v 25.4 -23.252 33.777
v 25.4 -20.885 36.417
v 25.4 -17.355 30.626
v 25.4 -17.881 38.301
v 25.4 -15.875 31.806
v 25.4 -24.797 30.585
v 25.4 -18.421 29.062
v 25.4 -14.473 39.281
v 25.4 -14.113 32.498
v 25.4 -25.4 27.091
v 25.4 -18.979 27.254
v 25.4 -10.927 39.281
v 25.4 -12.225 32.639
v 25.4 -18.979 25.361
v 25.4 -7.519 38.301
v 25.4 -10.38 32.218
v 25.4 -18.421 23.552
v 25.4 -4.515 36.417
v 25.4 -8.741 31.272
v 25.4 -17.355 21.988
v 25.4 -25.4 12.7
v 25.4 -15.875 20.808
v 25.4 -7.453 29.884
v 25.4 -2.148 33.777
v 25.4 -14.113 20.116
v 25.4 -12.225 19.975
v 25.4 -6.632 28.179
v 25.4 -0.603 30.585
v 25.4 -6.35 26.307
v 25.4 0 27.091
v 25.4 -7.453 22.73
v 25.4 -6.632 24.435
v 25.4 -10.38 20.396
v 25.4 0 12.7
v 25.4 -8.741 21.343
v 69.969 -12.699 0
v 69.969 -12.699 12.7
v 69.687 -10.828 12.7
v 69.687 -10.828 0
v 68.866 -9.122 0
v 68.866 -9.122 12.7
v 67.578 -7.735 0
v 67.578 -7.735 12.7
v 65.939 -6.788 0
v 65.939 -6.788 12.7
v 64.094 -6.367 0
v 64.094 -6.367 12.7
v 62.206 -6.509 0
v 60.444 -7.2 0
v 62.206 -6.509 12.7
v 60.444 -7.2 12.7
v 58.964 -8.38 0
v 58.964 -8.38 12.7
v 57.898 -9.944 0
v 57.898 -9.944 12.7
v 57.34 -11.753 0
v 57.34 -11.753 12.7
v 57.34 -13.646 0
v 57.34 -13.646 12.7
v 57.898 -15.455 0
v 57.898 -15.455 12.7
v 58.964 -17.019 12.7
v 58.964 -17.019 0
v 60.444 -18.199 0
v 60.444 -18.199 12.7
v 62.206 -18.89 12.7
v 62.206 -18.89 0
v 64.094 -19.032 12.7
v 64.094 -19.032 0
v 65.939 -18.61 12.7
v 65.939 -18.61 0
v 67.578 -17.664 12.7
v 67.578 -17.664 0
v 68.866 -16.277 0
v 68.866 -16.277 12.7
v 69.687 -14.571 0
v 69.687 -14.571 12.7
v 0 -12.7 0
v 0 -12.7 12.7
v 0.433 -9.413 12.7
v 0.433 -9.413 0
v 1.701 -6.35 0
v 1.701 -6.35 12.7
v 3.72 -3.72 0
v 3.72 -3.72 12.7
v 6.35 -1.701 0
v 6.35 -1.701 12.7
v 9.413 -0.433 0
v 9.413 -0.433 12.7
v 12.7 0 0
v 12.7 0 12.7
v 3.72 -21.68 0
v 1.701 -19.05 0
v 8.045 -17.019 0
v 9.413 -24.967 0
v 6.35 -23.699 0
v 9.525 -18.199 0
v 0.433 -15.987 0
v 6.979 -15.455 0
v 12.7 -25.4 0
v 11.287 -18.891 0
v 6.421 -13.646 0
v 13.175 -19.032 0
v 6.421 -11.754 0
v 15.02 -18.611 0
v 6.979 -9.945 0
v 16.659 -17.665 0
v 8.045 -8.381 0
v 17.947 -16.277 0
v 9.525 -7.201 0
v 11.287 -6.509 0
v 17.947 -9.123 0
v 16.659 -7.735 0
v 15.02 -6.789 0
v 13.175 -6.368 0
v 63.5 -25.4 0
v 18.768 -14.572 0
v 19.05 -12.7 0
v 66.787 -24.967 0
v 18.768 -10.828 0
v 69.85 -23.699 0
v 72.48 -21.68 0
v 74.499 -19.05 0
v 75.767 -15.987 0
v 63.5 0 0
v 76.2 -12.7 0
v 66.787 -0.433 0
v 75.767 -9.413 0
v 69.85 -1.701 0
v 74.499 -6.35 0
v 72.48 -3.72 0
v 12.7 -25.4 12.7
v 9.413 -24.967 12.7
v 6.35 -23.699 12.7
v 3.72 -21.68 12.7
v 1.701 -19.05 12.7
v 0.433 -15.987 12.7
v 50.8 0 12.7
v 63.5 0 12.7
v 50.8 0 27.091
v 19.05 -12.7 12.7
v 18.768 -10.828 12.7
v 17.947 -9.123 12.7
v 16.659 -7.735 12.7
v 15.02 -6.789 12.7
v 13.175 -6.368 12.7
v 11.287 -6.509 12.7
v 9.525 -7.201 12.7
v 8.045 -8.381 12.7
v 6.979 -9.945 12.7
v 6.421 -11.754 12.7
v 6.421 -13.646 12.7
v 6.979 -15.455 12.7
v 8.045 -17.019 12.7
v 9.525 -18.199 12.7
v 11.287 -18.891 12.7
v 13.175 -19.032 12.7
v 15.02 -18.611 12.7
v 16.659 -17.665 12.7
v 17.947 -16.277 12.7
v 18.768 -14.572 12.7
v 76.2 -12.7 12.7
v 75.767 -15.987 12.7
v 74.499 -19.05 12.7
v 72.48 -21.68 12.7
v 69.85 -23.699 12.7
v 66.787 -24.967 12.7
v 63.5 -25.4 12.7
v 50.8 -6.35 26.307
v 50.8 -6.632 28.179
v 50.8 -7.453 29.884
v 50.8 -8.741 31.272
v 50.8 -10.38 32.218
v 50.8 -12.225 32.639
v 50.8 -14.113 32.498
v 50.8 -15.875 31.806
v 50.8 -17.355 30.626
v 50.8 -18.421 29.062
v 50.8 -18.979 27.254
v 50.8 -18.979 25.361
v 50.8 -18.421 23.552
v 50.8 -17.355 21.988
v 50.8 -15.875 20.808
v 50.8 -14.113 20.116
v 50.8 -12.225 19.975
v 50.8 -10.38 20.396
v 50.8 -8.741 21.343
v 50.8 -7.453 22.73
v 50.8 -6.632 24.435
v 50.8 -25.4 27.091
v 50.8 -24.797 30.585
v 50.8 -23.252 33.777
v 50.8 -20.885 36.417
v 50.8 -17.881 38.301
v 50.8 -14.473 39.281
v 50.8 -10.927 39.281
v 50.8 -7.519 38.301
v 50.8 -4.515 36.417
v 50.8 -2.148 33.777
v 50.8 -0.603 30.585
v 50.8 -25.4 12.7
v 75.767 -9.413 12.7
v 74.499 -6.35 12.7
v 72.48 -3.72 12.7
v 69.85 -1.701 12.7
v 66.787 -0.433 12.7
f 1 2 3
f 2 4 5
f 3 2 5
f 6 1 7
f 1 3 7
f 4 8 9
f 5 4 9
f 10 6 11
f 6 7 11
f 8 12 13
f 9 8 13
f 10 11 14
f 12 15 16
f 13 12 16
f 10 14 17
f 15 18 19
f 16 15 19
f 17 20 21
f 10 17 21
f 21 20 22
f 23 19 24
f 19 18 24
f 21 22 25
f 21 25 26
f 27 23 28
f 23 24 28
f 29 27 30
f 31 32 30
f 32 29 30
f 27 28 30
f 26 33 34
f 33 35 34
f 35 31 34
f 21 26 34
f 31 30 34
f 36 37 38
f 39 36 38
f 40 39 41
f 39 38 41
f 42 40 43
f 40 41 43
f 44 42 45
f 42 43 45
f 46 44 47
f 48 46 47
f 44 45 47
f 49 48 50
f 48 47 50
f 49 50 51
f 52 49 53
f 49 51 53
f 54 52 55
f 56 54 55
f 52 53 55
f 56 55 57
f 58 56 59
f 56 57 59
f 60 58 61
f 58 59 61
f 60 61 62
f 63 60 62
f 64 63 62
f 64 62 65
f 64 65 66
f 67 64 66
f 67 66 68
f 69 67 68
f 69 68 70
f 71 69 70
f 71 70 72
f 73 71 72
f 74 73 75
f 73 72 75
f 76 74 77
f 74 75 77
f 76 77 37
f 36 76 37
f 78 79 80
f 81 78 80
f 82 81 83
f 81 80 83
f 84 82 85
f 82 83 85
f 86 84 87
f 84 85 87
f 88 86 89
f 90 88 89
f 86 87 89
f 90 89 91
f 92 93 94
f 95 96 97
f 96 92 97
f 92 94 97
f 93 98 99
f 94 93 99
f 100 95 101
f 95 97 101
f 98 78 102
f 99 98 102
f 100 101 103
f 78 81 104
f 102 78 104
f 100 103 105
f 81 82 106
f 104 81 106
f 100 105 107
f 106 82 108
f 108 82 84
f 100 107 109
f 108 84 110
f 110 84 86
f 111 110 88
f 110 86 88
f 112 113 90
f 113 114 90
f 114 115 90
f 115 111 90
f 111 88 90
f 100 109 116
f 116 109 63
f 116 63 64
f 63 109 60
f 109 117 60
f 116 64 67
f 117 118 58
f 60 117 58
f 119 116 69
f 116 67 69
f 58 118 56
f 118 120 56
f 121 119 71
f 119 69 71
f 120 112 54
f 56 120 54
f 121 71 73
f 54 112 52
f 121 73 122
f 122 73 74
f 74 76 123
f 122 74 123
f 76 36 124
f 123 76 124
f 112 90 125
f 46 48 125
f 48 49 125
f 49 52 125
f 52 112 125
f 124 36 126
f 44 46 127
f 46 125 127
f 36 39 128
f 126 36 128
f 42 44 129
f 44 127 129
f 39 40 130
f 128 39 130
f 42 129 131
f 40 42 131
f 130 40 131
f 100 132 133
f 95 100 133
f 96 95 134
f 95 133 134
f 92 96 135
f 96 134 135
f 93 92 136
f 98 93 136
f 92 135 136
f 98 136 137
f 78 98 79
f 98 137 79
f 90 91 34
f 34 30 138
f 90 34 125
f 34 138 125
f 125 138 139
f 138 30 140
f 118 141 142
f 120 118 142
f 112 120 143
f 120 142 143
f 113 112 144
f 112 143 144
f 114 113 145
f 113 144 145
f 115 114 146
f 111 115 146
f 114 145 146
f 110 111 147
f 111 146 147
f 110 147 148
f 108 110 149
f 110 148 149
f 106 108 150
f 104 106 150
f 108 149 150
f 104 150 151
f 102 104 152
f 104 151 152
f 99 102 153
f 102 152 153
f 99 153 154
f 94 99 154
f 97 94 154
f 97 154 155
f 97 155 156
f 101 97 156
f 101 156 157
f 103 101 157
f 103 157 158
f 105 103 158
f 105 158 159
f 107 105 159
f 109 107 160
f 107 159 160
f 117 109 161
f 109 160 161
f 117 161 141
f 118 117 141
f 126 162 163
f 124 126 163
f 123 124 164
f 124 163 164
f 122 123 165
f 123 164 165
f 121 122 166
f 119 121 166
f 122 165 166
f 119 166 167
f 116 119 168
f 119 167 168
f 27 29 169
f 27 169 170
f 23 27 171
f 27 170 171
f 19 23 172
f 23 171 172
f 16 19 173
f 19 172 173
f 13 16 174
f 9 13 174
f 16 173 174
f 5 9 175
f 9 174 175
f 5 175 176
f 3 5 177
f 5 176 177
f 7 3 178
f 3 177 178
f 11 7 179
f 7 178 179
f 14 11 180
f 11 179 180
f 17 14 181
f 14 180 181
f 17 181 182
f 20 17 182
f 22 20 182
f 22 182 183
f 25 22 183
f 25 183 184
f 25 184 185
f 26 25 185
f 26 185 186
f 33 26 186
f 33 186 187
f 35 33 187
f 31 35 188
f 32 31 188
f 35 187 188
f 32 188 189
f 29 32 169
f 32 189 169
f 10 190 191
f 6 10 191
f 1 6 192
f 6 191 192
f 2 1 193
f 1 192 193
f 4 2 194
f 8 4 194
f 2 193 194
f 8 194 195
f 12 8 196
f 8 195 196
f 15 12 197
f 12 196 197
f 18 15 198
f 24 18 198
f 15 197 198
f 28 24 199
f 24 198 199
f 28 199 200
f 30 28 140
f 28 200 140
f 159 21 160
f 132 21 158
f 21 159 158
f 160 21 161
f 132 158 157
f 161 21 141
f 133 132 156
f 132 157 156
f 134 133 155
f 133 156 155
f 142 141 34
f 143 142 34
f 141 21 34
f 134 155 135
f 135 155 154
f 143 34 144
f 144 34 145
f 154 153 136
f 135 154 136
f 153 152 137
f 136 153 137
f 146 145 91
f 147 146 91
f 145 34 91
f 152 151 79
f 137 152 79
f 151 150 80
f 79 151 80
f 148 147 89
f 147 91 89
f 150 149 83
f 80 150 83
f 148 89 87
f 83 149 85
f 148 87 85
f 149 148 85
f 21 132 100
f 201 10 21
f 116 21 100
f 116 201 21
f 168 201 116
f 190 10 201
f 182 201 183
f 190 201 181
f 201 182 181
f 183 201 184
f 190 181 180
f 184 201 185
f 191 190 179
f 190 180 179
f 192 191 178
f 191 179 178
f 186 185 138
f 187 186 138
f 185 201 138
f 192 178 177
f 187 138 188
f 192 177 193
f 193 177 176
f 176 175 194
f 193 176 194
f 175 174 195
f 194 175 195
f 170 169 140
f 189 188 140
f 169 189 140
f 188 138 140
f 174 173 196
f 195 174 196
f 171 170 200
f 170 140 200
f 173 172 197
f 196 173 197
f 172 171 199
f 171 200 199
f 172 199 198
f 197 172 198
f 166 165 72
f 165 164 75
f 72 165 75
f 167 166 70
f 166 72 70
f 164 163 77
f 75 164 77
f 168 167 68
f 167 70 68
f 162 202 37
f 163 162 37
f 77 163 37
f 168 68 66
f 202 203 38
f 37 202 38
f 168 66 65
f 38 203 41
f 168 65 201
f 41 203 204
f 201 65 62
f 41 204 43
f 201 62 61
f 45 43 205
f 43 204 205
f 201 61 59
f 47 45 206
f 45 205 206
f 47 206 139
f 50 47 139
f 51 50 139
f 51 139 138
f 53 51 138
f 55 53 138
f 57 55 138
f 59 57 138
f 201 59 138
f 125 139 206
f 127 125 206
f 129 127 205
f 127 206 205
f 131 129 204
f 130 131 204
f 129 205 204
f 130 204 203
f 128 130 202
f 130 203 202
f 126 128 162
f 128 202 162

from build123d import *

# Parameters (mm, degrees)
F1_DEPTH  = 25.4
F2_R      = 6.35
F3_DEPTH  = 12.7
F5_DEPTH  = 12.7
F6_R      = 6.35
F7_DEPTH  = 12.7
F9_DEPTH  = 12.7
F10_R     = 6.35
F11_DEPTH = 25.4
F13_DEPTH = 25.4


with BuildPart() as f1:
    # F0 (on Front) → F1 (new body)
    with BuildSketch(Plane.XZ):
        Polygon((0, 12.7), (0, 0), (76.2, 0), (76.2, 12.7), (50.8, 12.7), (50.8, 39.9142862895), (25.4, 39.9142862895), (25.4, 12.7), align=None)
    extrude(amount=F1_DEPTH)

    # F2 (on face) → F3 (cut)
    with BuildSketch(Plane.XY.offset(12.7)):
        with Locations((63.6192816147, -12.6994398261)):
            Circle(F2_R)
    extrude(amount=-F3_DEPTH, mode=Mode.SUBTRACT)

    # F4 (on face) → F5 (cut)
    with BuildSketch(Plane.XY.offset(12.7)):
        with BuildLine():
            ThreePointArc((63.5, 0), (72.4802561211, -3.7197438789), (76.2, -12.7))
            Line((76.2, -12.7), (76.2, 0))
            Line((76.2, 0), (63.5, 0))
        make_face()
        with BuildLine():
            ThreePointArc((76.2, -12.7), (72.4802561211, -21.6802561211), (63.5, -25.4))
            Line((63.5, -25.4), (76.2, -25.4))
            Line((76.2, -25.4), (76.2, -12.7))
        make_face()
    extrude(amount=-F5_DEPTH, mode=Mode.SUBTRACT)

    # F6 (on face) → F7 (cut)
    with BuildSketch(Plane.XY.offset(12.7)):
        with Locations((12.7, -12.7)):
            Circle(F6_R)
    extrude(amount=-F7_DEPTH, mode=Mode.SUBTRACT)

    # F8 (on face) → F9 (cut)
    with BuildSketch(Plane.XY.offset(12.7)):
        with BuildLine():
            ThreePointArc((12.7, -25.4), (3.7197438789, -21.6802561211), (0, -12.7))
            Line((0, -12.7), (0, -25.4))
            Line((0, -25.4), (12.7, -25.4))
        make_face()
        with BuildLine():
            ThreePointArc((0, -12.7), (3.7197438789, -3.7197438789), (12.7, 0))
            Line((12.7, 0), (0, 0))
            Line((0, 0), (0, -12.7))
        make_face()
    extrude(amount=-F9_DEPTH, mode=Mode.SUBTRACT)

    # F10 (on face) → F11 (cut)
    with BuildSketch(Plane.YZ.offset(50.8)):
        with Locations((-12.7, 26.3071431448)):
            Circle(F10_R)
    extrude(amount=-F11_DEPTH, mode=Mode.SUBTRACT)

    # F12 (on face) → F13 (cut)
    with BuildSketch(Plane.YZ.offset(50.8)):
        with BuildLine():
            ThreePointArc((-25.4, 27.0906584082), (-12.7, 39.4049416249), (0, 27.0906584082))
            Line((0, 27.0906584082), (0, 39.9142862895))
            Line((0, 39.9142862895), (-25.4, 39.9142862895))
            Line((-25.4, 39.9142862895), (-25.4, 27.0906584082))
        make_face()
    extrude(amount=-F13_DEPTH, mode=Mode.SUBTRACT)


solid = f1.part
